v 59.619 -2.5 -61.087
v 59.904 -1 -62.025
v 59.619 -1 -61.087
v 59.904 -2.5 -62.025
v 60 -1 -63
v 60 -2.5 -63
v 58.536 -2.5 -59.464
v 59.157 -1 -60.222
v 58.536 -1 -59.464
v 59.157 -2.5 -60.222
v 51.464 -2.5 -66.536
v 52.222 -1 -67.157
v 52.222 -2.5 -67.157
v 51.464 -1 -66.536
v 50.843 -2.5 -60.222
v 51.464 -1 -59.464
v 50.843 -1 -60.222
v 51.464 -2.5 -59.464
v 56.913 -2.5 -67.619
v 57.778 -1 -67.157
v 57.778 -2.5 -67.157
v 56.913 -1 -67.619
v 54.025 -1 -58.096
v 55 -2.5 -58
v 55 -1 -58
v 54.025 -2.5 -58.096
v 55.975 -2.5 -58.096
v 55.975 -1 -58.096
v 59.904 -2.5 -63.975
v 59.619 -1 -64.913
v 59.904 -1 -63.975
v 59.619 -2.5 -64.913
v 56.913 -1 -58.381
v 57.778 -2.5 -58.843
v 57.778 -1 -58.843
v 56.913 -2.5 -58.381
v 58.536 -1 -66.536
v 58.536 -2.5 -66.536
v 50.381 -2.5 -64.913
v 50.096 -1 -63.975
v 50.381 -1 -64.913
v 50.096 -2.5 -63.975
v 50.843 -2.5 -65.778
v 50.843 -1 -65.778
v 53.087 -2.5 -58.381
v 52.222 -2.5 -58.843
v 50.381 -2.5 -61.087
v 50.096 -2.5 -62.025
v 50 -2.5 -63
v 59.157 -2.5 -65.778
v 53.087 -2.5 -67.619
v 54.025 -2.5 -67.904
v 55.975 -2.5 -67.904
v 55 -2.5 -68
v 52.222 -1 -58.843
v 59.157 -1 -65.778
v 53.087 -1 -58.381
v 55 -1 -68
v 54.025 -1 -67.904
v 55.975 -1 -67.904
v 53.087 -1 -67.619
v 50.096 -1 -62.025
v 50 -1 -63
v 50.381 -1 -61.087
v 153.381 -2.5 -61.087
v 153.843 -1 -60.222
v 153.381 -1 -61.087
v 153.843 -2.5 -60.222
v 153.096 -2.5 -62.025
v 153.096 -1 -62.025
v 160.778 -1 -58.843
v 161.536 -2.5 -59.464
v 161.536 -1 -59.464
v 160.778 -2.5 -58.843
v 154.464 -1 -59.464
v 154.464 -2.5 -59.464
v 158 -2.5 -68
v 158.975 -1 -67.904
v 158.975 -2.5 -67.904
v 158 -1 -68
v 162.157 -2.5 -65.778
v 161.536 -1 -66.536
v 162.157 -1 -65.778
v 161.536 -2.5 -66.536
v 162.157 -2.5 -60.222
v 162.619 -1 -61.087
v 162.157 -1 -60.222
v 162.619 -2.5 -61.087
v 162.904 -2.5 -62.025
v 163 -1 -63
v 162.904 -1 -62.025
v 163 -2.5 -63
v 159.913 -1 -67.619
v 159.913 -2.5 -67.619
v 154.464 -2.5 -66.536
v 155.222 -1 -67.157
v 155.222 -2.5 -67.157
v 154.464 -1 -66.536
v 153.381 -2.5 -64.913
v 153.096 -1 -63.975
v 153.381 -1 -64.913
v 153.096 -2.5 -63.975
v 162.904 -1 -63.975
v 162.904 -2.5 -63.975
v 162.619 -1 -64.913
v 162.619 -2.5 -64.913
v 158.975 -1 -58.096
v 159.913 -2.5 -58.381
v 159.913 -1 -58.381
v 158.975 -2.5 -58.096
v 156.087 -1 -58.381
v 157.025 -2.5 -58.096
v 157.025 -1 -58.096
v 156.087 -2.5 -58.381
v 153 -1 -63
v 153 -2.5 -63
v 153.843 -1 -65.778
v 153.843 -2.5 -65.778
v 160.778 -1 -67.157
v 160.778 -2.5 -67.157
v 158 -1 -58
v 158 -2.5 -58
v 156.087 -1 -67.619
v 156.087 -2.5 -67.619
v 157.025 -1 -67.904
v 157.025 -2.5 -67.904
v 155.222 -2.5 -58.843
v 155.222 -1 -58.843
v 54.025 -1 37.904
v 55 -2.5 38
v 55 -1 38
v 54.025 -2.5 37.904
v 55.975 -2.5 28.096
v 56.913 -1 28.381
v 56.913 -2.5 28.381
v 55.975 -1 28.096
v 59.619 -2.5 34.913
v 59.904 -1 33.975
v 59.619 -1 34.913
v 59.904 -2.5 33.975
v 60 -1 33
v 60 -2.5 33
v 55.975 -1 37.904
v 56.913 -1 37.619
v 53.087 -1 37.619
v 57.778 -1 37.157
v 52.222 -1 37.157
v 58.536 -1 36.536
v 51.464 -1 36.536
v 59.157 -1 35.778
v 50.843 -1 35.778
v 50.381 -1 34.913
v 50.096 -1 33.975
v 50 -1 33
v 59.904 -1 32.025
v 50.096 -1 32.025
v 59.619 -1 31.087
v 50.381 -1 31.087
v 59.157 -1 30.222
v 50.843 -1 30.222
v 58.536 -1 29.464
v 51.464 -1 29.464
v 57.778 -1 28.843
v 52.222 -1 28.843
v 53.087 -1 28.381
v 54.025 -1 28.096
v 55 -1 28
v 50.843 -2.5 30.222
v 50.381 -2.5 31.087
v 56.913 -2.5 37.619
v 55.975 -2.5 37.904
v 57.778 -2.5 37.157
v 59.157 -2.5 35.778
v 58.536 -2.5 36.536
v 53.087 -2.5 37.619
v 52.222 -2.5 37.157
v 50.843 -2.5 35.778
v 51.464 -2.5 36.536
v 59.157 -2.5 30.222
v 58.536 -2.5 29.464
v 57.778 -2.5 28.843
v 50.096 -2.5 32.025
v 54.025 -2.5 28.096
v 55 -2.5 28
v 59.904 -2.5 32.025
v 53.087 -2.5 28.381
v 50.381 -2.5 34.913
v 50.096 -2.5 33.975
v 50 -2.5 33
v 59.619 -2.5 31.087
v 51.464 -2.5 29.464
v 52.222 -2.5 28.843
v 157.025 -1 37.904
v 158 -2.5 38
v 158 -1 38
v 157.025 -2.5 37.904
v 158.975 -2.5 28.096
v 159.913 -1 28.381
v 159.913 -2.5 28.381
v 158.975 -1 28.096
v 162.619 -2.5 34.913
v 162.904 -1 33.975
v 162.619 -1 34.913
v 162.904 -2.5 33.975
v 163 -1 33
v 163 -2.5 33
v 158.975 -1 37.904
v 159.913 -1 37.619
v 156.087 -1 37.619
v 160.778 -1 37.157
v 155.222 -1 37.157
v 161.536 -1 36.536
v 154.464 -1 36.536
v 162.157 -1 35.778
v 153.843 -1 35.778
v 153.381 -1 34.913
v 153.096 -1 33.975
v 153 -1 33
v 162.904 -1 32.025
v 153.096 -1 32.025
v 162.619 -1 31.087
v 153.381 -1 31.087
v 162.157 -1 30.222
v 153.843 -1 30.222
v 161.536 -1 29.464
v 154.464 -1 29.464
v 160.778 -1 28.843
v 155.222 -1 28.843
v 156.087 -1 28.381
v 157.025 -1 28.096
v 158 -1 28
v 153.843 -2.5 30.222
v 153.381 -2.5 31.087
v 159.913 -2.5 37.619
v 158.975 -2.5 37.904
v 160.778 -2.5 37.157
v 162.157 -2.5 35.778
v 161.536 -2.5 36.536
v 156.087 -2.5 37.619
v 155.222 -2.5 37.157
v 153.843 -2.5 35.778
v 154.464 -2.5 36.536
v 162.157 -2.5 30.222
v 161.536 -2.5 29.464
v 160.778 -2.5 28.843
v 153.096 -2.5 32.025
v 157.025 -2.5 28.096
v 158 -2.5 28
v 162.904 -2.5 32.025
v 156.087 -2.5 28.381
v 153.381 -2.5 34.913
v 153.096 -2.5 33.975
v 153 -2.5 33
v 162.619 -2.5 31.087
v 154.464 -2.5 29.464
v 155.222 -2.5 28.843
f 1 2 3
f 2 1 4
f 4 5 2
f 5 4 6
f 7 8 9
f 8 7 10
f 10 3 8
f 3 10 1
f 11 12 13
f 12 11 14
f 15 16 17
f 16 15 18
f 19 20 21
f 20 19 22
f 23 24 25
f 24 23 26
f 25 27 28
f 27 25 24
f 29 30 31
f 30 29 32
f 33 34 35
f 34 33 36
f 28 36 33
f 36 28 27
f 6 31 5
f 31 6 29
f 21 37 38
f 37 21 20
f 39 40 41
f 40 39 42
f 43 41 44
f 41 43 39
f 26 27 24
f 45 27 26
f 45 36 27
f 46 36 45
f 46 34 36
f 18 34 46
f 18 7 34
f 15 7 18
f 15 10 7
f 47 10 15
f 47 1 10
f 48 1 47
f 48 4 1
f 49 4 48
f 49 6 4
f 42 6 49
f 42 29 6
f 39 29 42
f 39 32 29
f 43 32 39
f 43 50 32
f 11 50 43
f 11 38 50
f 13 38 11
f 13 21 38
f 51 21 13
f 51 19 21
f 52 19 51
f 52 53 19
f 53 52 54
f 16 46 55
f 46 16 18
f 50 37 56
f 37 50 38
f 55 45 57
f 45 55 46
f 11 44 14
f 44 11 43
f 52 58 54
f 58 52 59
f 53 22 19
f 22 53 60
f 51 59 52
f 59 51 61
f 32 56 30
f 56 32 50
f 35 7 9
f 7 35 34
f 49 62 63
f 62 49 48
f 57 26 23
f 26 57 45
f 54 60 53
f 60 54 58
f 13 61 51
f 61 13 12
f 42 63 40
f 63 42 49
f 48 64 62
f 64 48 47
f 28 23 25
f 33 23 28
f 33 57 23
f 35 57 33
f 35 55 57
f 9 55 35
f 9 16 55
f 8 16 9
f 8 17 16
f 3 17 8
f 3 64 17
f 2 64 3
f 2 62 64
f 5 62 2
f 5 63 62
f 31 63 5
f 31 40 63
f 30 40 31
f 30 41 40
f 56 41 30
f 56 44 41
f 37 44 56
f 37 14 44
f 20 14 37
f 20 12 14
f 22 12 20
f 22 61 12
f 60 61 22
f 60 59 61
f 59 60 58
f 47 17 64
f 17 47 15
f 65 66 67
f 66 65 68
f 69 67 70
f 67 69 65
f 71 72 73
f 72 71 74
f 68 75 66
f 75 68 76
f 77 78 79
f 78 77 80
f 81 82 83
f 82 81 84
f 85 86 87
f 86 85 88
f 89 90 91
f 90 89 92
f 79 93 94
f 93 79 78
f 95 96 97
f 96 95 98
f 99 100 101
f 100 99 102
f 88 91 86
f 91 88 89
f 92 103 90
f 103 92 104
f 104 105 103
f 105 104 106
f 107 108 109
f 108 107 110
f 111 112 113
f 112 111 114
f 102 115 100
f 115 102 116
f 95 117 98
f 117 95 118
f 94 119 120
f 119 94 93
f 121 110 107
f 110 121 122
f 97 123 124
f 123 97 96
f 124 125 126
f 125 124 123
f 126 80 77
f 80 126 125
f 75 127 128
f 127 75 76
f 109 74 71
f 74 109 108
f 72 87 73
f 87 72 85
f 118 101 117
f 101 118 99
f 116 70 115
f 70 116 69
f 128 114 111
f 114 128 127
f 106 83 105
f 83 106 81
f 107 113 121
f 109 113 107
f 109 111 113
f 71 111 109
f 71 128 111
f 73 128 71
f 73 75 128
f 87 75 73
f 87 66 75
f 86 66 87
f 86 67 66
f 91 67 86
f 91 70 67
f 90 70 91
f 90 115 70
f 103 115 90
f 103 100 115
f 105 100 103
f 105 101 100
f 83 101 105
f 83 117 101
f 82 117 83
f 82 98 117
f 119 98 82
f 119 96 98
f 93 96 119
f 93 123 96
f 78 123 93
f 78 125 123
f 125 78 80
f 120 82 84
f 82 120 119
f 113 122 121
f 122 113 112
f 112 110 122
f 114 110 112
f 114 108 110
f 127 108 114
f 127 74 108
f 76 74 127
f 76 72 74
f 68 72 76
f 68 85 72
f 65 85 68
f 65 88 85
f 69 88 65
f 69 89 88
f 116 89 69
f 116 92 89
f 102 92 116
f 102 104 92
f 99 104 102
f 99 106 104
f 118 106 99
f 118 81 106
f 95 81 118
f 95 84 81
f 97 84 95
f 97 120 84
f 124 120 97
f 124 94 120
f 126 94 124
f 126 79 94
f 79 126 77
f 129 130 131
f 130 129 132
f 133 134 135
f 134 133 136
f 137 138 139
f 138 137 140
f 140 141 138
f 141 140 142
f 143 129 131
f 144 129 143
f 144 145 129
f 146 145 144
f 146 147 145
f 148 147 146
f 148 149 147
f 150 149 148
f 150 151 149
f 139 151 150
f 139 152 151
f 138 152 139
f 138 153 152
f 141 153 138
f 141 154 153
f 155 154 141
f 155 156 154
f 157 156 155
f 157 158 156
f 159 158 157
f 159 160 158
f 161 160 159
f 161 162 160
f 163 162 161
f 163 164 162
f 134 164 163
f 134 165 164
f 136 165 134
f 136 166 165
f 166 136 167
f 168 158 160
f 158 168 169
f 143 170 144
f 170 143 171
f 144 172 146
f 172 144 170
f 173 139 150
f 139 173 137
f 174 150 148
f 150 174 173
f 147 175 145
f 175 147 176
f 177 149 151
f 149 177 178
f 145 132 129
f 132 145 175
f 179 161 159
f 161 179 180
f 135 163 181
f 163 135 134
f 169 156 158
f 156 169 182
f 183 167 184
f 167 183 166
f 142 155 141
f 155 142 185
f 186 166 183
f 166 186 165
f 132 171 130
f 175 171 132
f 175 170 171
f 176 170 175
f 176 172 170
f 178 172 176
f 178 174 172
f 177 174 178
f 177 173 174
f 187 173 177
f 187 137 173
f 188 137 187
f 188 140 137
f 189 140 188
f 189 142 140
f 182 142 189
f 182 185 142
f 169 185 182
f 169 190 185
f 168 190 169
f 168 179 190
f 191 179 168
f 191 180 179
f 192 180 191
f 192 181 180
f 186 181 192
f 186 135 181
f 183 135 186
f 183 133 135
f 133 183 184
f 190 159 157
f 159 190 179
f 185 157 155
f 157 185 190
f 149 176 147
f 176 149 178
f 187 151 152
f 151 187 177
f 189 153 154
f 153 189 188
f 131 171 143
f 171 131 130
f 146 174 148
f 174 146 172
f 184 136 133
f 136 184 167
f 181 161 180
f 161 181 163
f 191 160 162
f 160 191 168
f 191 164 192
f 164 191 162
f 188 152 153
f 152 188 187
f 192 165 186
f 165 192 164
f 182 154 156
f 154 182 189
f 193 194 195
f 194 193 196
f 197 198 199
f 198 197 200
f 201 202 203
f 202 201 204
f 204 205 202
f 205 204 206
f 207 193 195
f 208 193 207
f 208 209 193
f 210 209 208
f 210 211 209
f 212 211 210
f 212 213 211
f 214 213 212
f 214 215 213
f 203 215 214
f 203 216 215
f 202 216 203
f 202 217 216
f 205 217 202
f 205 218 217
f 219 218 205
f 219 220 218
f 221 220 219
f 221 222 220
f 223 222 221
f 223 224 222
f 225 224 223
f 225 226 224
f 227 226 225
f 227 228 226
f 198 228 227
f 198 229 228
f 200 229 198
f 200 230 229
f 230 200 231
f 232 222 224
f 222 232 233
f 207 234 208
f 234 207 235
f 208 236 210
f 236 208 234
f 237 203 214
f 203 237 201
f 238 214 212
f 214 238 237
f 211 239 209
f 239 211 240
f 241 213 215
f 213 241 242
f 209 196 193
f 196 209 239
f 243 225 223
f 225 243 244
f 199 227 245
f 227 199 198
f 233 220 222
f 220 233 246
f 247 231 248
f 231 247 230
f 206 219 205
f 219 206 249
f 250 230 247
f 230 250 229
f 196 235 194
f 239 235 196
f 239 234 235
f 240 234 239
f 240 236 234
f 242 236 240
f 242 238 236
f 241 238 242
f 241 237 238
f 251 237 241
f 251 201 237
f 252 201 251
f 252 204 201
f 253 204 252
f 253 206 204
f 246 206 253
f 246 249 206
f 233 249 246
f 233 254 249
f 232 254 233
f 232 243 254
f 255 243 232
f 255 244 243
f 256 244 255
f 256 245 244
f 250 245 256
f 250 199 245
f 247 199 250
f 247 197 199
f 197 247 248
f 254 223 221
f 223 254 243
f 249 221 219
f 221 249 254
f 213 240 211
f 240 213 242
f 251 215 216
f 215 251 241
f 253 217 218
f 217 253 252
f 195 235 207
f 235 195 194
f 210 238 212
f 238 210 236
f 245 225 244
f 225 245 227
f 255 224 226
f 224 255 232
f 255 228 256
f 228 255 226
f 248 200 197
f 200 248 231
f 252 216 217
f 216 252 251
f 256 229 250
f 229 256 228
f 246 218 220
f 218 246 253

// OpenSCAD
for(p=[[55,-63],[158,-63],[55,33],[158,33]]) translate([p[0],-1,p[1]]) rotate([90,0,0]) cylinder(h=1.5,d=10,$fn=32);
